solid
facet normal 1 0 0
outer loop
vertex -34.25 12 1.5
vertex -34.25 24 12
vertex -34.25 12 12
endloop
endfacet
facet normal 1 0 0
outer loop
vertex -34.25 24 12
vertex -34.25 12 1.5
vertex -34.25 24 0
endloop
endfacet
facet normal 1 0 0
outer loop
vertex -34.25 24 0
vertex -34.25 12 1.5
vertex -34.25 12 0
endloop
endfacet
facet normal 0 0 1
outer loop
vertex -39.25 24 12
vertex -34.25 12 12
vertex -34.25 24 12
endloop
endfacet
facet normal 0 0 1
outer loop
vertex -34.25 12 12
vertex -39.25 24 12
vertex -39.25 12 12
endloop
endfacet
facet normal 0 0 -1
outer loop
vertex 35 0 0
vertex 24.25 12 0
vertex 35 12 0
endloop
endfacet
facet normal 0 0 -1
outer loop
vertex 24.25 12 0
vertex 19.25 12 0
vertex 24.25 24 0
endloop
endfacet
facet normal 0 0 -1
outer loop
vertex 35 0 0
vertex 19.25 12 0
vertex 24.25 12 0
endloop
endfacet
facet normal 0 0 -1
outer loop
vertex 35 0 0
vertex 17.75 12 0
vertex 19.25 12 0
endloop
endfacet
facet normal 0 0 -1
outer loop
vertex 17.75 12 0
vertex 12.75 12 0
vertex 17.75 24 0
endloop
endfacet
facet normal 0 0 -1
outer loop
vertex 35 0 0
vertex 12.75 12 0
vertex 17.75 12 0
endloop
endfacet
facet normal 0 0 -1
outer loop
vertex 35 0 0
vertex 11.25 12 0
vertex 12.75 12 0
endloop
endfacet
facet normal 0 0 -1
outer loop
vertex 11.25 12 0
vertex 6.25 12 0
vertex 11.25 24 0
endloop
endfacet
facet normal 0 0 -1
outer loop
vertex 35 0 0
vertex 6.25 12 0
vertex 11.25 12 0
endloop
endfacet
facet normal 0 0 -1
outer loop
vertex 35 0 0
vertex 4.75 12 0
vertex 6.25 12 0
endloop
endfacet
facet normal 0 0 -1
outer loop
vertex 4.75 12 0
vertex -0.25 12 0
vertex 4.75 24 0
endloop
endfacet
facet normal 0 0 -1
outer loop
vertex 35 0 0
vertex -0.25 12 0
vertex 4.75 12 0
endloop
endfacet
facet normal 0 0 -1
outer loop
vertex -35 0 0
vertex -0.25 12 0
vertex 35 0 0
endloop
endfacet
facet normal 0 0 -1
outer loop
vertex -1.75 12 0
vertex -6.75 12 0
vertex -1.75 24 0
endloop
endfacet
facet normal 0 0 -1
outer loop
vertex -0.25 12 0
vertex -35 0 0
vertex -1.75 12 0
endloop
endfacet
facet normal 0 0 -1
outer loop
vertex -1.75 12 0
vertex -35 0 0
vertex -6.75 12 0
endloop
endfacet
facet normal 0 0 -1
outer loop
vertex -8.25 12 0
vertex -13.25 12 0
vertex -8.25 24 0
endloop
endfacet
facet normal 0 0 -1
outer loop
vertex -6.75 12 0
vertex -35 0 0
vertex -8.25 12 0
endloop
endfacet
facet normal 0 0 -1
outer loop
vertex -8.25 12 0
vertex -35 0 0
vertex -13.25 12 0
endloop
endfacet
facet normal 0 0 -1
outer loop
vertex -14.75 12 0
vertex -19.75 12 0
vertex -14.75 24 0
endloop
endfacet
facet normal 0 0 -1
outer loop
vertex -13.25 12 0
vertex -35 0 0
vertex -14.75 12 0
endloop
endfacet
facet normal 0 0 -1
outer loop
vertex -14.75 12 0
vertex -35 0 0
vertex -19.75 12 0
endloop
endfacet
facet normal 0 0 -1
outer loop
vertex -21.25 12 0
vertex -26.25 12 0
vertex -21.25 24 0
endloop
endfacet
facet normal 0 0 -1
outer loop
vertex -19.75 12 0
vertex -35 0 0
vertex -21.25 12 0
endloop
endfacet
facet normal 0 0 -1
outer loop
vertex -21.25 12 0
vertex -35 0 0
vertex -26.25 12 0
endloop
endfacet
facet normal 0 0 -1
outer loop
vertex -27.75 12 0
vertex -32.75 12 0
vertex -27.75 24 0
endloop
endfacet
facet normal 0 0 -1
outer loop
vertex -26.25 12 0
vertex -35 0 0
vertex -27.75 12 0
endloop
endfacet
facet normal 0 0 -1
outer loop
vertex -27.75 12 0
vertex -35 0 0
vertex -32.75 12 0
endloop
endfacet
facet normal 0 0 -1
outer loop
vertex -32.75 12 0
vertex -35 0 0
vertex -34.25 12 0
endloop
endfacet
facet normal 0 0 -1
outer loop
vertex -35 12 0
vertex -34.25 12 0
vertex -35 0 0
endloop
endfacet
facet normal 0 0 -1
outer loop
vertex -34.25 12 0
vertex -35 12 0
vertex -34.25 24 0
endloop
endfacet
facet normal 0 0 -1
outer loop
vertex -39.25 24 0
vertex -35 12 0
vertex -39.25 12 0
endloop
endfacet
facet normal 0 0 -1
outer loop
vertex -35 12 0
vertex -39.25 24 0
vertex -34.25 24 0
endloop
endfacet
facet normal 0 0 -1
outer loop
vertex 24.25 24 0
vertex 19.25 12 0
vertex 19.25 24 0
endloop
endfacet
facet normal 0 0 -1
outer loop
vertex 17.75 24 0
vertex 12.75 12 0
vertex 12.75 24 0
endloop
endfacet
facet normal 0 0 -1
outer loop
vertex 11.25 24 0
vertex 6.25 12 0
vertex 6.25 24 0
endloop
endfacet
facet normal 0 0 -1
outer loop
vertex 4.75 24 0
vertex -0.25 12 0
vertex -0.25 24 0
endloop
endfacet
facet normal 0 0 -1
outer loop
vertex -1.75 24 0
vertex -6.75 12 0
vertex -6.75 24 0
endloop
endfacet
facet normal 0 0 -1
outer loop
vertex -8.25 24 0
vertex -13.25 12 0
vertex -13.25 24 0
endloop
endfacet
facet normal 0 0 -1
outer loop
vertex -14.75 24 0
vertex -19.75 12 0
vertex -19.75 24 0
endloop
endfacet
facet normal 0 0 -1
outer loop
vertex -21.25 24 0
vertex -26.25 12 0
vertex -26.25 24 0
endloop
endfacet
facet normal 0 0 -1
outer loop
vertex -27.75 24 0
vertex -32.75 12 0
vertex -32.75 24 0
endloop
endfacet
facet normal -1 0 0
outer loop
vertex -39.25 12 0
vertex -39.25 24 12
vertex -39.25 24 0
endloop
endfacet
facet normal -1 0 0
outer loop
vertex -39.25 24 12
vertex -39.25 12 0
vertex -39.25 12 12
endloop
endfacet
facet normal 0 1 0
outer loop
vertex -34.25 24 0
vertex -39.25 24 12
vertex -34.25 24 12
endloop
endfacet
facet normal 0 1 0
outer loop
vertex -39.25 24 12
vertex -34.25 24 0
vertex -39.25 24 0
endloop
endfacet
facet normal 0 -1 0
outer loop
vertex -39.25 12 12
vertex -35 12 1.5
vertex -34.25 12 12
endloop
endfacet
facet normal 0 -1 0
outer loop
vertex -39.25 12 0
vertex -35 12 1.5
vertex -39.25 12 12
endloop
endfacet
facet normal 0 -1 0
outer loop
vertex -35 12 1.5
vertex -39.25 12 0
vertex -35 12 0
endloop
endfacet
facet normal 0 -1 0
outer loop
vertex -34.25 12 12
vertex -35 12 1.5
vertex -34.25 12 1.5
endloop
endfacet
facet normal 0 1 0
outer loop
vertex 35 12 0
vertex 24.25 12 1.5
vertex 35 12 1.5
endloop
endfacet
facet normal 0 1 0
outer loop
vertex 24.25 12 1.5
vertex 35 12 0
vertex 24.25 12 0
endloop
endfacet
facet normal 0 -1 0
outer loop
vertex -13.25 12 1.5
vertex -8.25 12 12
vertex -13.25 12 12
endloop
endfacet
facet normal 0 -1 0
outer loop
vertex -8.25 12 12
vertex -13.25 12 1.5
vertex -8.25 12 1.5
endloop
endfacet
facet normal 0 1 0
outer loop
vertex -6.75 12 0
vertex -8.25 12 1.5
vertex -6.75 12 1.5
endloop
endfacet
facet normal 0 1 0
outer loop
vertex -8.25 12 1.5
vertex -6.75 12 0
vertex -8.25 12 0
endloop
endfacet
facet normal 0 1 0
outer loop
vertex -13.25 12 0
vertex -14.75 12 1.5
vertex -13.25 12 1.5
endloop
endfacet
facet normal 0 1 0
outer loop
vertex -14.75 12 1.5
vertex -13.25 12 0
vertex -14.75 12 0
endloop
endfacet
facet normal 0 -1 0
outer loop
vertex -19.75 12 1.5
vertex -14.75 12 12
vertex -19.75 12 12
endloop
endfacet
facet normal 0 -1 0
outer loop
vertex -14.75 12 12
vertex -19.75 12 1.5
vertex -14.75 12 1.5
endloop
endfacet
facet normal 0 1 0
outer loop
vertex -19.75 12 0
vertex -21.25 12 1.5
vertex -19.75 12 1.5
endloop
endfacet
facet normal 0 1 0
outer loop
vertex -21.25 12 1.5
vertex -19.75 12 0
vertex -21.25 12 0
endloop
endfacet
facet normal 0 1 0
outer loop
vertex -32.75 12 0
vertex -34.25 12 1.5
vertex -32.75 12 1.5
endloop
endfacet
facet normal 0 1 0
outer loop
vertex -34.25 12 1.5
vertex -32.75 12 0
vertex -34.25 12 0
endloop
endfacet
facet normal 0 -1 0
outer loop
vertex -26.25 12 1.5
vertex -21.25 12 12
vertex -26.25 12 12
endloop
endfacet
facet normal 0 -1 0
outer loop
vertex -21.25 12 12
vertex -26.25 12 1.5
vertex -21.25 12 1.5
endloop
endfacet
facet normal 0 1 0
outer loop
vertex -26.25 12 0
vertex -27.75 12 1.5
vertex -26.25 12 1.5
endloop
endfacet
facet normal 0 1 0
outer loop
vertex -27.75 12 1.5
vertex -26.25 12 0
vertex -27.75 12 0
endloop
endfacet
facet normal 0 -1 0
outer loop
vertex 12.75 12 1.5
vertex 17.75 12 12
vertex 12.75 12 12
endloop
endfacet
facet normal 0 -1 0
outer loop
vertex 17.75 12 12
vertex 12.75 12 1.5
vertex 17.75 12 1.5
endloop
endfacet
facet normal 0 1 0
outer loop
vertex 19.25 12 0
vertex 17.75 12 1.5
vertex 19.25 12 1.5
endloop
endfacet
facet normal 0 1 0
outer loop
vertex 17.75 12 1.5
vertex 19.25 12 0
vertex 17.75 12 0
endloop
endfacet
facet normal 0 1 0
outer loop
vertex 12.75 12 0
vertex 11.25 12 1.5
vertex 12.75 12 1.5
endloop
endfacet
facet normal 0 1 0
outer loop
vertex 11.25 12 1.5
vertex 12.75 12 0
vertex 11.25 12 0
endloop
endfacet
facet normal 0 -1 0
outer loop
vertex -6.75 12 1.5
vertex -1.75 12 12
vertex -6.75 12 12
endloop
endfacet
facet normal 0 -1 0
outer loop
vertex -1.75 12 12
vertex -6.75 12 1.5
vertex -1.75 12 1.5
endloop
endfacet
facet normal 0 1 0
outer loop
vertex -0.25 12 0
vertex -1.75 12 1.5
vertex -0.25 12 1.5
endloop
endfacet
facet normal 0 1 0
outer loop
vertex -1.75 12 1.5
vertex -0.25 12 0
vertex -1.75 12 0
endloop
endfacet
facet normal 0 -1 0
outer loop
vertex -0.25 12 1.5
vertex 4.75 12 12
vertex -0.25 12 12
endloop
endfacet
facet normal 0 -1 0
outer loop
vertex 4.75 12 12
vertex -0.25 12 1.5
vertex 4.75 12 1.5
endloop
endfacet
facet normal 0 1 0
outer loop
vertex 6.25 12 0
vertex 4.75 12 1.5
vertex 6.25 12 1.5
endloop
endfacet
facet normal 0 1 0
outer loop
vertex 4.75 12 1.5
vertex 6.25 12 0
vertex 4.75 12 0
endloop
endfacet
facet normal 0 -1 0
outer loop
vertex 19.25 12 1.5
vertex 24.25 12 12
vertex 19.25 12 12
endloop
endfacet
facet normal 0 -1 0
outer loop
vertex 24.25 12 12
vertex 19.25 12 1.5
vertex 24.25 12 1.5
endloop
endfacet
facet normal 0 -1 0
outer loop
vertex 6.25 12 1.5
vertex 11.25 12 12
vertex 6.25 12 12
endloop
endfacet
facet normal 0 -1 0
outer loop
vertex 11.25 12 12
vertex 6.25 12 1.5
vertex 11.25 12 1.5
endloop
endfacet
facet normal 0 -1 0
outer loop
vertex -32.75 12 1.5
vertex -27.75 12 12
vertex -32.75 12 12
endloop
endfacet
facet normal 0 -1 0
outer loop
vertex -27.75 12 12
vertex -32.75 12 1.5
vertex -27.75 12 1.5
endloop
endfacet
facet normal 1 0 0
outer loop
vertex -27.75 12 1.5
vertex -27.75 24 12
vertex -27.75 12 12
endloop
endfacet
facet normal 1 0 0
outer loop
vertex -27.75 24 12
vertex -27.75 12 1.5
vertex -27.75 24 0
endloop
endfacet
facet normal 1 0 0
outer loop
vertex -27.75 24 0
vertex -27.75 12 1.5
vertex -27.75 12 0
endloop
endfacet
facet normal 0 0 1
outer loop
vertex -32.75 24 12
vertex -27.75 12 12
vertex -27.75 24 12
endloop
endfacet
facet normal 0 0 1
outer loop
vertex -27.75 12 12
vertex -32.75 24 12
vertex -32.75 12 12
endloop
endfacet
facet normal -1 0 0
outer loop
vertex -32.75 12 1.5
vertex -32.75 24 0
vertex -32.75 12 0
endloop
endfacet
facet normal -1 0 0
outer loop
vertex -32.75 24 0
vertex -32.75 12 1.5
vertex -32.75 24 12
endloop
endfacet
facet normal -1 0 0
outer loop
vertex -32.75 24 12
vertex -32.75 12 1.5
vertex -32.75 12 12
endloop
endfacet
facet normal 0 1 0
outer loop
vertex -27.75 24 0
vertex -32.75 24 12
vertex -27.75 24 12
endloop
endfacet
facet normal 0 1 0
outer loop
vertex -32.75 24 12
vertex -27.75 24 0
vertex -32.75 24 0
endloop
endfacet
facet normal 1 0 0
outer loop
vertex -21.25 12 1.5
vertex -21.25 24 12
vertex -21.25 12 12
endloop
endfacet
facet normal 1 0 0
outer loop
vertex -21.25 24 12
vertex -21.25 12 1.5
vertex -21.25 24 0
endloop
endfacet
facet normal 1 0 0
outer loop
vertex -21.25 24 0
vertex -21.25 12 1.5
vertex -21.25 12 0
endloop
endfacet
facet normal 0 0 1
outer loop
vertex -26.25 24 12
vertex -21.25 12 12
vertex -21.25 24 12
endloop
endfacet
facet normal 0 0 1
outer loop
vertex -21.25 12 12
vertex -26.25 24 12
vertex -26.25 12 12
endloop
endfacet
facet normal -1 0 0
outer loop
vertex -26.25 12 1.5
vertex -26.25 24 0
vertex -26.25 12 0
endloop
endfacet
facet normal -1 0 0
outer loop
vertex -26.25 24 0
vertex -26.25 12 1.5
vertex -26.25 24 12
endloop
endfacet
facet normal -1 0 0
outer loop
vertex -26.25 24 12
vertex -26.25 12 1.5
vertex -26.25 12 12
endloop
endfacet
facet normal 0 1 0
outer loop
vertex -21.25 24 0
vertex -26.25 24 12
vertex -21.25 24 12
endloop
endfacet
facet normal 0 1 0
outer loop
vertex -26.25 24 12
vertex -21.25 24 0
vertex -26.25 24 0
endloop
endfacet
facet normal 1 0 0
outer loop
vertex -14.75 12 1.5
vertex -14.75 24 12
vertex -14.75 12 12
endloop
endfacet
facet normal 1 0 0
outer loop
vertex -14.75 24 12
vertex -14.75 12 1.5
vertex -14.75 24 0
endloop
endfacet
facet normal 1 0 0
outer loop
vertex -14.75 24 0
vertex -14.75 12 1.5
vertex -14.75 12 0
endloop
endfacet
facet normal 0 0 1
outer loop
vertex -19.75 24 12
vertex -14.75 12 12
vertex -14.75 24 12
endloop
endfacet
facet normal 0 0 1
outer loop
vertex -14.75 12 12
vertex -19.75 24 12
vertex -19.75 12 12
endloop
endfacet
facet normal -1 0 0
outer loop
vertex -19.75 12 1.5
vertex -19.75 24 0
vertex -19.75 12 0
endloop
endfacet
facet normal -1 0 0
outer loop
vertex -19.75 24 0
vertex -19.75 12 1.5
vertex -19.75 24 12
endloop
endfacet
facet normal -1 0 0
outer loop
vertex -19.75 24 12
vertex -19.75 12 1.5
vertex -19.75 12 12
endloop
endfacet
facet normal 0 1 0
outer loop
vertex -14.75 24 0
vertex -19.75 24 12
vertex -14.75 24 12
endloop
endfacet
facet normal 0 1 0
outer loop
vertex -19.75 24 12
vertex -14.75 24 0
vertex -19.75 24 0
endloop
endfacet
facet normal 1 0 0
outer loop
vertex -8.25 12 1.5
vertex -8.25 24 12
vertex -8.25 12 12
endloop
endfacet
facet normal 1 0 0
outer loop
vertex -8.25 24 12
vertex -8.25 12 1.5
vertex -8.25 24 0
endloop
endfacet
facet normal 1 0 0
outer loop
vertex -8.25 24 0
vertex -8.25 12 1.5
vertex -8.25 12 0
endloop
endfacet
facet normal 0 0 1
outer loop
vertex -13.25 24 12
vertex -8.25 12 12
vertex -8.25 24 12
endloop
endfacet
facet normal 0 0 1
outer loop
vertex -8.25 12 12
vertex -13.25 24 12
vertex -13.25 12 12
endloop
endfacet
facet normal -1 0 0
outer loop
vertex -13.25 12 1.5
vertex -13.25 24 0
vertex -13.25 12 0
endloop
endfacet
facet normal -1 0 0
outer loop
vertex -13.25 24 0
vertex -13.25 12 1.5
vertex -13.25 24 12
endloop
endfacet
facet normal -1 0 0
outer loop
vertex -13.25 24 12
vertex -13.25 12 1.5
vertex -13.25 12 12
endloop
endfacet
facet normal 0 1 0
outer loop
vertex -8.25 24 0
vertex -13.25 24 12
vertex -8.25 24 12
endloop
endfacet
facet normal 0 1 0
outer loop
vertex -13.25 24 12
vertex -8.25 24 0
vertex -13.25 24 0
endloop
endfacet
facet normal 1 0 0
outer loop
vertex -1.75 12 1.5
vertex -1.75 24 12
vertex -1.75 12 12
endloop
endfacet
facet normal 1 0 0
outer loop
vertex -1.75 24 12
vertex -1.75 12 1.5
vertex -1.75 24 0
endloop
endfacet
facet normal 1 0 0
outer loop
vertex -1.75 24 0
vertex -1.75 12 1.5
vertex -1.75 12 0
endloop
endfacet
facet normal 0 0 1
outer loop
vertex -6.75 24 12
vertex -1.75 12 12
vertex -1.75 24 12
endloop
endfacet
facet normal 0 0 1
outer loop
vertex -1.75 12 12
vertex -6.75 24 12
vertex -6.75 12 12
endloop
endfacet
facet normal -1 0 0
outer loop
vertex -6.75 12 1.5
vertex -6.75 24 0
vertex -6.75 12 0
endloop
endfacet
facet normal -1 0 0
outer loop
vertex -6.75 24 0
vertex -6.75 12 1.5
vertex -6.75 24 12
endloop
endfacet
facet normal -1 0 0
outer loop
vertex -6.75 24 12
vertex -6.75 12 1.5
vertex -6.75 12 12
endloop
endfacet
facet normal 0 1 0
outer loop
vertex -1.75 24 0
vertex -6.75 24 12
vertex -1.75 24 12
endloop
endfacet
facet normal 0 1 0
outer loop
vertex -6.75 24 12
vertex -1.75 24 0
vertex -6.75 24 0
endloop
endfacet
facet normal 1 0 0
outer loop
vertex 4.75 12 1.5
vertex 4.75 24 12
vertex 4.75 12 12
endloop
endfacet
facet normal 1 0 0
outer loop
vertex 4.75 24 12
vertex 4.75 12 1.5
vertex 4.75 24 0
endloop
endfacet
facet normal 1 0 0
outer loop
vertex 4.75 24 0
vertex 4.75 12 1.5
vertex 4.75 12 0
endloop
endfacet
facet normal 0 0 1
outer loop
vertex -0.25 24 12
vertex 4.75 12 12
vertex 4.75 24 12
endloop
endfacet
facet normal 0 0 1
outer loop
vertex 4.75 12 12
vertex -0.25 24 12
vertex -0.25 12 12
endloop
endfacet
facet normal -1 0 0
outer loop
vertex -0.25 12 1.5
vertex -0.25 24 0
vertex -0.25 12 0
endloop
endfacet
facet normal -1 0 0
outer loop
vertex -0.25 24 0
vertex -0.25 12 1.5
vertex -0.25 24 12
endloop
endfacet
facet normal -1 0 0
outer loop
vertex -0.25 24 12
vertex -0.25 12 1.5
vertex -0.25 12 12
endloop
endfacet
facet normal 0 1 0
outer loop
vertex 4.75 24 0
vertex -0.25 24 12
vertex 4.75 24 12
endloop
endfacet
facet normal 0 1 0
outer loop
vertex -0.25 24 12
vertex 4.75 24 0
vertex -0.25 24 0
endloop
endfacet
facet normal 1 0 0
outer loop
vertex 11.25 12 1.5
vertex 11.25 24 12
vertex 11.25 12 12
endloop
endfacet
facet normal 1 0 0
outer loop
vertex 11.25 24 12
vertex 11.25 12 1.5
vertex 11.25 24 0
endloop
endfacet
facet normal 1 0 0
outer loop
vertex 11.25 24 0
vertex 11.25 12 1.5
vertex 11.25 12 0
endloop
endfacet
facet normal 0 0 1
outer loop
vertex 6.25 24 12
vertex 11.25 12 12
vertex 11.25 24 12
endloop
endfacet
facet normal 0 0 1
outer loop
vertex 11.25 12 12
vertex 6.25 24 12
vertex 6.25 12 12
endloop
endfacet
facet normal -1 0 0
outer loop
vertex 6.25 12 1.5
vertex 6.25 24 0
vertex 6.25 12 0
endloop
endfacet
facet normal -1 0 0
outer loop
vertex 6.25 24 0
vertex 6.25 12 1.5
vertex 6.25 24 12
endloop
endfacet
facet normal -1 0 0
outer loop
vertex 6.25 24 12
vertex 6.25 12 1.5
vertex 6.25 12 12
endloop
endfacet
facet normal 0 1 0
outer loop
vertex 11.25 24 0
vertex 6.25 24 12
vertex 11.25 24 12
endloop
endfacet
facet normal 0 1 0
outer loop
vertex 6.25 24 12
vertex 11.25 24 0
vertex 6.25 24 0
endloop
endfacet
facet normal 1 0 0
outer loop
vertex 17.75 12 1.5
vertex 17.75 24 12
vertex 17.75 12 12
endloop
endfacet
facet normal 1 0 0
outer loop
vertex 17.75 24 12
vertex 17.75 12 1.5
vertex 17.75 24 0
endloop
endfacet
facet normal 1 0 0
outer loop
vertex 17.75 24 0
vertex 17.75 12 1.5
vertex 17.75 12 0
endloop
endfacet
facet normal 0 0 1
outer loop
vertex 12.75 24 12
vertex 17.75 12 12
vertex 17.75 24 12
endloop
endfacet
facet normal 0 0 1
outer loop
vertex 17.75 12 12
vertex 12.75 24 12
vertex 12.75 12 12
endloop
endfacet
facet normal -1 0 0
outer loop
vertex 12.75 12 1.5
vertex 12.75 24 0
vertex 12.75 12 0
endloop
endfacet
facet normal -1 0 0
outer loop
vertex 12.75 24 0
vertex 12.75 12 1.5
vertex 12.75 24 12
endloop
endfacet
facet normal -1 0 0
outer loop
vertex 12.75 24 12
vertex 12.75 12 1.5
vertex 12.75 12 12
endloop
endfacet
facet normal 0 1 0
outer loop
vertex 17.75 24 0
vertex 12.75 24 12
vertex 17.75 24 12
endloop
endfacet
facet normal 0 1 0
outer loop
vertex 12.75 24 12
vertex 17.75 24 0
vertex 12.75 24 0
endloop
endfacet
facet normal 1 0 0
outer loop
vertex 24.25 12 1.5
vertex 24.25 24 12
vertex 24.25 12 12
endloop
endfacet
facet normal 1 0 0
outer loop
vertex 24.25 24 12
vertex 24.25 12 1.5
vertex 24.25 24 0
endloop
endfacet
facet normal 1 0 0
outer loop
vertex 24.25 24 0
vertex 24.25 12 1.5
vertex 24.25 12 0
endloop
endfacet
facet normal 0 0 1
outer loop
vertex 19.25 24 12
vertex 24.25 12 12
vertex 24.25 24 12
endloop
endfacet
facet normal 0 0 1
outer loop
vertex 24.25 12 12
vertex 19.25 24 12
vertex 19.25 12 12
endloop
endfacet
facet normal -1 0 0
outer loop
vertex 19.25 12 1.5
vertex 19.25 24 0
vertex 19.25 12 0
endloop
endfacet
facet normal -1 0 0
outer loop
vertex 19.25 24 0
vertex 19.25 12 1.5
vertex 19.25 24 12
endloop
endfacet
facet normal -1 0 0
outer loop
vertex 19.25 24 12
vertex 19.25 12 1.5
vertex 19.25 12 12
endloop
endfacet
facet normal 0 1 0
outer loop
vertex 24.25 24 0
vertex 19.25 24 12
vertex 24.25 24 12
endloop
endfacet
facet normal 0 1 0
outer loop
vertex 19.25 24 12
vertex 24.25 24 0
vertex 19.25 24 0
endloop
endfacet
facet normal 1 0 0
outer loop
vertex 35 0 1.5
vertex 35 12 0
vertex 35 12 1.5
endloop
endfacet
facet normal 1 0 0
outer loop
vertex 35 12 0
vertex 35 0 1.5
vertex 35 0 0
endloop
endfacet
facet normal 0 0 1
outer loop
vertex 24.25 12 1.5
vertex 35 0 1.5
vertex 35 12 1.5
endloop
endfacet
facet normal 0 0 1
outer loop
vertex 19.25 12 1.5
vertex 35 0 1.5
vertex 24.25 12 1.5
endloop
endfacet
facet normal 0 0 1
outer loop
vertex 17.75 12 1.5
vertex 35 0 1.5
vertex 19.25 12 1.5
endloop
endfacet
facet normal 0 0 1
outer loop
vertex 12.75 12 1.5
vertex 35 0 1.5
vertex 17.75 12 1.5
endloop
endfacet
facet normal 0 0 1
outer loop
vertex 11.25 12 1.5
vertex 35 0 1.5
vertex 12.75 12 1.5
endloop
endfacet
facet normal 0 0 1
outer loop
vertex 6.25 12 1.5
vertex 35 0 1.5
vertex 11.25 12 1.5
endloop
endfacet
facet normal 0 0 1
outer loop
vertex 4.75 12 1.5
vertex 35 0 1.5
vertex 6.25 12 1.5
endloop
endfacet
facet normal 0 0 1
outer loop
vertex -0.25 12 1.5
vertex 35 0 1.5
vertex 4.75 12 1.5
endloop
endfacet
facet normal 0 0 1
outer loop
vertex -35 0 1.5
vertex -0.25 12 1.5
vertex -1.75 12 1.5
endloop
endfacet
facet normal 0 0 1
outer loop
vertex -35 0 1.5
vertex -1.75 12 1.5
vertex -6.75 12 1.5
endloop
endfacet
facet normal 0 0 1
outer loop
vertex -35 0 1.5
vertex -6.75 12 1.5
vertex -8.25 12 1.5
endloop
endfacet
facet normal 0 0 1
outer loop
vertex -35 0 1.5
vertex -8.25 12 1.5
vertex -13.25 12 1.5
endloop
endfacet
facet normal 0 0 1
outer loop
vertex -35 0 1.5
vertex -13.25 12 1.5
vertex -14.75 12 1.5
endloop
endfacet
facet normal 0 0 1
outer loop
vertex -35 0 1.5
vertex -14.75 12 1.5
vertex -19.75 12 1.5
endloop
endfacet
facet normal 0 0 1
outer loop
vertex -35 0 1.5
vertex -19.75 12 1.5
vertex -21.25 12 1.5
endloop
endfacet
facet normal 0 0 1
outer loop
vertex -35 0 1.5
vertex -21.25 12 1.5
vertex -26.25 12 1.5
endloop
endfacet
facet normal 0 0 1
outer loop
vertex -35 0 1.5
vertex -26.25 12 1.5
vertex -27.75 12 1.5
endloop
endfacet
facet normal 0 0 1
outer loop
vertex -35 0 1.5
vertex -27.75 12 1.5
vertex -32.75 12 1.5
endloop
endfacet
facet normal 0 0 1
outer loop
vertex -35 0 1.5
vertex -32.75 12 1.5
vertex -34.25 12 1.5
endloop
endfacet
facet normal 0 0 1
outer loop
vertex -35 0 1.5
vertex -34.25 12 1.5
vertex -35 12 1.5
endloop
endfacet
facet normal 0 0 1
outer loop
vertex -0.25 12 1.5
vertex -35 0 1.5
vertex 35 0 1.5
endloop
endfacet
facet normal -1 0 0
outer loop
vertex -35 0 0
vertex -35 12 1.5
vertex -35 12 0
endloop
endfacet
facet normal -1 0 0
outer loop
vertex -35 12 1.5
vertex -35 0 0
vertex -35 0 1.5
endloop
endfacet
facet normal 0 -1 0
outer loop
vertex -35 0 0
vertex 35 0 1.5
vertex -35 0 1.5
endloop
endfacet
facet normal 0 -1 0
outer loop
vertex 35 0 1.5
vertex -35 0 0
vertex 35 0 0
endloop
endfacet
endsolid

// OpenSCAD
// 10-well comb for casting agarose gels
// Print orientation: flat on bed, teeth pointing up (+Z)

// ---------- Parameters ----------
plate_len    = 70;    // spine length along X (mm)
plate_wid    = 12;    // spine width along Y (mm)
plate_t      = 1.5;   // plate thickness along Z (mm)

tooth_count  = 10;    // number of wells
tooth_w      = 5.0;   // tooth width along X (mm)
tooth_len    = 12;    // tooth length along Y (mm)
tooth_h      = 12;    // tooth height above plate (Z) (mm)
tooth_pitch  = 1.5;   // gap between neighbouring teeth (mm)

eps          = 0.5;   // cutter overshoot past faces (mm)
$fn          = 64;    // curve resolution

// ---------- Derived ----------
row_span    = (tooth_count - 1) * tooth_pitch;  // total gap width
x_start     = -(plate_len / 2 + row_span / 2) + tooth_w / 2;  // first tooth centre X

// ---------- Model ----------
union() {
    // Spine (back bar)
    translate([-plate_len / 2, 0, 0])
        cube([plate_len, plate_wid, plate_t]);

    // Teeth
    for (i = [0 : tooth_count - 1])
        translate([x_start + i * (tooth_w + tooth_pitch),
                   plate_wid,
                   0])
            cube([tooth_w, tooth_len, tooth_h]);
}

// ---------- Cut wells ----------
difference() {
    // Comb body
    union() {
        translate([-plate_len / 2, 0, 0])
            cube([plate_len, plate_wid, plate_t]);
        for (i = [0 : tooth_count - 1])
            translate([x_start + i * (tooth_w + tooth_pitch),
                       plate_wid,
                       0])
                cube([tooth_w, tooth_len, tooth_h]);
    }

    // Well cutters, extend past top face
    for (i = [0 : tooth_count - 1])
        translate([x_start + i * (tooth_w + tooth_pitch) - eps,
                   plate_wid + eps,
                   -eps])
            cube([tooth_w + 2 * eps, tooth_len + eps, tooth_h + 2 * eps]);
}
